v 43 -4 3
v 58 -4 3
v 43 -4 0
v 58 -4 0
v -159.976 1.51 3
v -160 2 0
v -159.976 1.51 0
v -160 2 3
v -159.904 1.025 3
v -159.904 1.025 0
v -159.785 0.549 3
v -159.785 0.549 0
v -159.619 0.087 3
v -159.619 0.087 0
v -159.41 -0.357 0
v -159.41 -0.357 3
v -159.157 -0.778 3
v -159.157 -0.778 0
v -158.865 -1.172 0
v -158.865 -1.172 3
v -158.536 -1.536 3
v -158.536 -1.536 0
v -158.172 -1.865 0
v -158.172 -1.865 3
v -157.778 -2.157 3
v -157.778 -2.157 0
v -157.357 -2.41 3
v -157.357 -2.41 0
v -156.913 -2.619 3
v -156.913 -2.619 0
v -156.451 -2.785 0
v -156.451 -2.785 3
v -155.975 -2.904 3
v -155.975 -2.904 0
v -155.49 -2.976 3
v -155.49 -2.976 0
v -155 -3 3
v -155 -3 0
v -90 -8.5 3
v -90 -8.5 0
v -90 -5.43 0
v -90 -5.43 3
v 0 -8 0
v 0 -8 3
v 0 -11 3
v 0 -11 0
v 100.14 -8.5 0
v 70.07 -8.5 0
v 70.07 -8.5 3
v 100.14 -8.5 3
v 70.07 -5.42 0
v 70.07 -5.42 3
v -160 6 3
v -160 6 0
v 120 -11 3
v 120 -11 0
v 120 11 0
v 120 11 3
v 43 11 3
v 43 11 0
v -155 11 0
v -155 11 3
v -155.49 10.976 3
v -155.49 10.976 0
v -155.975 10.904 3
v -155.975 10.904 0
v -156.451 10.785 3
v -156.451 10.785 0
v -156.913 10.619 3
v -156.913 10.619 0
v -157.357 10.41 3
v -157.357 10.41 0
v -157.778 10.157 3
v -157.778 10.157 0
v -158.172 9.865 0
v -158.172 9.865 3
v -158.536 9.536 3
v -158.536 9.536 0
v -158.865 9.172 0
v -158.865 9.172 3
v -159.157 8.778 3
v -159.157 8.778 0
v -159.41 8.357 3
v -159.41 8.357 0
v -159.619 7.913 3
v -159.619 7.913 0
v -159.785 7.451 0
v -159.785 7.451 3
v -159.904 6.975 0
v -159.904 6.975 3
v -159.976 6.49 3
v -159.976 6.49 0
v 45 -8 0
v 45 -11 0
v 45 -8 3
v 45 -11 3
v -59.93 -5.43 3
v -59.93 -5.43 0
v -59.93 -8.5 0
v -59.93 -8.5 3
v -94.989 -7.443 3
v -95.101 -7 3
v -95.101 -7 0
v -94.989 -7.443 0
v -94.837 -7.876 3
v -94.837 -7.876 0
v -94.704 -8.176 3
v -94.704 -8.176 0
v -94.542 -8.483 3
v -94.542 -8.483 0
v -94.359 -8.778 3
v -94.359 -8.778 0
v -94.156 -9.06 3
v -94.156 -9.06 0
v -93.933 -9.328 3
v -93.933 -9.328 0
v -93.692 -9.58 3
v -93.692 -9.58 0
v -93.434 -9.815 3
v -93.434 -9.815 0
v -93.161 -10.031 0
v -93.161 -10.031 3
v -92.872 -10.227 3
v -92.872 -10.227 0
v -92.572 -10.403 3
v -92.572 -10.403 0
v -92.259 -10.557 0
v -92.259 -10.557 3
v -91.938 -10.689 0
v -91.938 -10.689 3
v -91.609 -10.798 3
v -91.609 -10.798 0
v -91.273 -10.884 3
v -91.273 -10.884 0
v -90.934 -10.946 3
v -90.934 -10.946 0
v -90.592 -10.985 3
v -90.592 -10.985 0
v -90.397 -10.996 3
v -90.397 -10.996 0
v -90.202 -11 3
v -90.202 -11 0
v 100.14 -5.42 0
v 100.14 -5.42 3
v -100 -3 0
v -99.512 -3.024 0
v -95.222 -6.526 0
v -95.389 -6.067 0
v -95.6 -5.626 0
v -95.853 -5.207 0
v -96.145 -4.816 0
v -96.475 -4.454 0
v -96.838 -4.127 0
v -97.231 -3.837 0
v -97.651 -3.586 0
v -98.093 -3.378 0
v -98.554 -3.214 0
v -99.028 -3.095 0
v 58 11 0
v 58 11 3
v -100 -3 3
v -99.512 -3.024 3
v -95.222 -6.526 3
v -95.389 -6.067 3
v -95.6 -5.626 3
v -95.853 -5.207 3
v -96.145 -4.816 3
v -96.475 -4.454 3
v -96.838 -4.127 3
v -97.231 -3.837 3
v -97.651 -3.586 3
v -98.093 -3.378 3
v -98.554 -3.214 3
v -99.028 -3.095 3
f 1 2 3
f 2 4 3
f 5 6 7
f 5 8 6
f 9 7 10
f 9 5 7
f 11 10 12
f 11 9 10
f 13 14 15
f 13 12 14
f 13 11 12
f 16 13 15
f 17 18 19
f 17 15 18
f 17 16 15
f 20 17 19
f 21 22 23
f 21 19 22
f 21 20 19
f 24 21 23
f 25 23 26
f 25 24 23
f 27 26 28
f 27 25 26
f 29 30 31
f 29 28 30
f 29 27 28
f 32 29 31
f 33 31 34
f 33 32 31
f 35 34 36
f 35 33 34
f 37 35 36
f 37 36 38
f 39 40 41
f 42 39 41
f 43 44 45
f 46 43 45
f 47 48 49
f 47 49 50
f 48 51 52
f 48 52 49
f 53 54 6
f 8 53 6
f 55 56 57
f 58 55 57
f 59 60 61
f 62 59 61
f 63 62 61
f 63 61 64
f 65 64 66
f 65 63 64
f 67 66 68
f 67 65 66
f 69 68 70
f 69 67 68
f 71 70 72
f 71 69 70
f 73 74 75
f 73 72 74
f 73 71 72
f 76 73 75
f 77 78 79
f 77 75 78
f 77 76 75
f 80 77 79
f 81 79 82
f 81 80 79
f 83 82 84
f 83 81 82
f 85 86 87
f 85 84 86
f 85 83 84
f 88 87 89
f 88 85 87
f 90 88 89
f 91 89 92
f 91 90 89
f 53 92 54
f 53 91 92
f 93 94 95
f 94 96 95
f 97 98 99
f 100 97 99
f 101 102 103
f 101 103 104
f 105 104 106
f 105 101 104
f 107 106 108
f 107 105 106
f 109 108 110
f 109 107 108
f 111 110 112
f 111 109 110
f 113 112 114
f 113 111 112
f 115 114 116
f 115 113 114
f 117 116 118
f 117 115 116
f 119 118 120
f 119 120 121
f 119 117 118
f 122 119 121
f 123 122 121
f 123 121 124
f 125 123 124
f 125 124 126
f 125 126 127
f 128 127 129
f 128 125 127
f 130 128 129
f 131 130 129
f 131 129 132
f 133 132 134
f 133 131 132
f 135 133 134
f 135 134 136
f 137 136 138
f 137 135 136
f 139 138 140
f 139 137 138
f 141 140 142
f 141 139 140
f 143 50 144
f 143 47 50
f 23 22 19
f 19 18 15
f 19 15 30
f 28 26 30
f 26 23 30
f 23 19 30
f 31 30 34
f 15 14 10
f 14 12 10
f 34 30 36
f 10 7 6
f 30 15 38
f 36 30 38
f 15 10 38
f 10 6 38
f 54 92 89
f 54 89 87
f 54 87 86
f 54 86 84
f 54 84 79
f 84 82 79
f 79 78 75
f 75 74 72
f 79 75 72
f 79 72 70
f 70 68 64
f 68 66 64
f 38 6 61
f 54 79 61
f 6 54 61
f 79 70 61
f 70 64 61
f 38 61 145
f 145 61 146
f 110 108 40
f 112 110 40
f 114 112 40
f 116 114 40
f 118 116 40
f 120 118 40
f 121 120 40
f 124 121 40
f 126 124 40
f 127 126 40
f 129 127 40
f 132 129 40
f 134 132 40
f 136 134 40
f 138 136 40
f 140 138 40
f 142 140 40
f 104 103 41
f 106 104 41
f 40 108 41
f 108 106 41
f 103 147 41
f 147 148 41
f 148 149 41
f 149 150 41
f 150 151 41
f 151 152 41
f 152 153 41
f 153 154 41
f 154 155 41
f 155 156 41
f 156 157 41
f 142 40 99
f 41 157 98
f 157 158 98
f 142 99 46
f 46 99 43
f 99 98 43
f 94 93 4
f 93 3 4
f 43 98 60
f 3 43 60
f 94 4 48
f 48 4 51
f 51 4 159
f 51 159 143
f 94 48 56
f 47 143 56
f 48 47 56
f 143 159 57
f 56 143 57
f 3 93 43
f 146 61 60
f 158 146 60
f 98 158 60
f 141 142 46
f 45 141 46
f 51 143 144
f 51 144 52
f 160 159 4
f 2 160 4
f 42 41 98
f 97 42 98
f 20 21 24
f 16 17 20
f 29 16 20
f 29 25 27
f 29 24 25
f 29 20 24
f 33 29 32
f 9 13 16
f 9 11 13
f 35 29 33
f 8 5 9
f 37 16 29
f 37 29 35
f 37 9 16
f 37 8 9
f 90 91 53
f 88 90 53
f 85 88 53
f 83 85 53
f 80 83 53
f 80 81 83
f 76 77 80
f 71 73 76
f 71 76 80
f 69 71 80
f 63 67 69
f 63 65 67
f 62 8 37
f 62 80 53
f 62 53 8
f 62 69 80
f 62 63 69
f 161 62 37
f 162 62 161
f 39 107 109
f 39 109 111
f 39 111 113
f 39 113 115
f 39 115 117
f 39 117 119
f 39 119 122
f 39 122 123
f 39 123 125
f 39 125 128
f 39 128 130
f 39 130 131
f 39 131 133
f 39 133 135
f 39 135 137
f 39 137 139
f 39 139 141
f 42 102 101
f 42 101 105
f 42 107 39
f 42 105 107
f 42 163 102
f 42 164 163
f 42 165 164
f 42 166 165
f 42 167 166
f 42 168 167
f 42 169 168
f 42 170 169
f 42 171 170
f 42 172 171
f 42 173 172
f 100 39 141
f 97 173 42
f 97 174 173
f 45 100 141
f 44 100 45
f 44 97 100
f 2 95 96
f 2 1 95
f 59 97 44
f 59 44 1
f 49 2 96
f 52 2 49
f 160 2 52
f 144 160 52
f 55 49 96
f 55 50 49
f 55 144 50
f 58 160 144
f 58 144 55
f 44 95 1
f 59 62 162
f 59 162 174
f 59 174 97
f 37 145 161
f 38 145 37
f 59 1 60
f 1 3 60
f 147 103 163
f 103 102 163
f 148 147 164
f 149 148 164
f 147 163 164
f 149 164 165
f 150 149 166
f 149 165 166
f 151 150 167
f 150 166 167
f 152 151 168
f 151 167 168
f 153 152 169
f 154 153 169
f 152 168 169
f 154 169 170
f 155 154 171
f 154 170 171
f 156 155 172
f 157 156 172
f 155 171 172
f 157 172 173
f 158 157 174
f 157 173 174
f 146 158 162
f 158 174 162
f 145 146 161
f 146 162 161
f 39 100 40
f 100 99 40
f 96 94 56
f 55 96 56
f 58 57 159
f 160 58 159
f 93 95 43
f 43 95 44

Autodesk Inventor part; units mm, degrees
ref_plane "YZ Plane" through (0, 0, 0) normal (1, 0, 0) x (0, 1, 0)
ref_plane "XZ Plane" through (0, 0, 0) normal (0, 1, 0) x (-1, 0, 0)
ref_plane "XY Plane" through (0, 0, 0) normal (0, 0, 1) x (1, 0, 0)
sketch "Sketch1" plane through (0, 0, 0) normal (0, 0, 1) x (1, 0, 0)
  line L0 (-120, -11) -> (120, -11)
  line L1 (120, -11) -> (120, 11)
  line L2 (120, 11) -> (-120, 11)
  line L3 (-120, 11) -> (-120, -11)
  line L4 (-120, -11) -> (120, 11) construction
  line L5 (120, -11) -> (-120, 11) construction
  line L6 (-90, -5.43) -> (-59.93, -5.43)
  line L7 (-59.93, -5.43) -> (-59.93, -8.5)
  line L8 (-59.93, -8.5) -> (-90, -8.5)
  line L9 (-90, -8.5) -> (-90, -5.43)
  line L10 (-90, -5.43) -> (-59.93, -8.5) construction
  line L11 (-59.93, -5.43) -> (-90, -8.5) construction
  line L12 (100.14, -5.42) -> (70.07, -5.42)
  line L13 (70.07, -5.42) -> (70.07, -8.5)
  line L14 (70.07, -8.5) -> (100.14, -8.5)
  line L15 (100.14, -8.5) -> (100.14, -5.42)
  line L16 (100.14, -5.42) -> (70.07, -8.5) construction
  line L17 (70.07, -5.42) -> (100.14, -8.5) construction
  line L18 (-120, -11) -> (-95, -11)
  line L19 (-95, -11) -> (-95, -3)
  line L20 (-95, -3) -> (-120, -3)
  line L21 (-120, -3) -> (-120, -11)
  line L22 (43, 11) -> (58, 11)
  line L23 (58, 11) -> (58, -4)
  line L24 (58, -4) -> (43, -4)
  line L25 (43, -4) -> (43, 11)
  line L26 (-120, 11) -> (-160, 11)
  line L27 (-160, 11) -> (-160, -3)
  line L28 (-160, -3) -> (-120, -3)
  line L29 (-120, -3) -> (-120, 11)
  point P0 (0, 0)
  point P1 (0, 0)
  point P2 (-74.965, -6.965)
  point P3 (85.105, -6.96)
  point P4 (58, 11)
  point P5 (-140, -3)
  dimension "d0" = 240
  dimension "d1" = 22
  dimension "d2" = 30.07
  dimension "d3" = 3.07
  dimension "d4" = 2.5
  dimension "d5" = 30
  dimension "d6" = 30.07
  dimension "d7" = 3.08
  dimension "d8" = 2.5
  dimension "d9" = 130
  dimension "d10" = 25
  dimension "d11" = 8
  dimension "d12" = 15
  dimension "d13" = 15
  dimension "d14" = 43
  dimension "d17" = 40
extrude "Plate1" add sketch "Sketch1" along normal blind 3 contours L19 L20 L3 L2 L25 L24 L23 L1 L0 | L28 L27 L26 L3
fillet "Corner Round1" radius 5 4 edges at (-95, -3, 1.5) (-95, -11, 1.5) (-160, -3, 1.5) (-160, 11, 1.5)
sketch "Sketch3" plane through (0, 0, 3) normal (0, 0, 1) x (1, 0, 0)
  line L0 (-90.202, -11) -> (120, -11) projected
  line L1 (0, -11) -> (45, -11)
  line L2 (45, -11) -> (45, -8)
  line L3 (45, -8) -> (0, -8)
  line L4 (0, -8) -> (0, -11)
  point P0 (0, 0)
  dimension "d22" = 3
  dimension "d23" = 45
extrude "Cut2" cut sketch "Sketch3" against normal blind 3
equation "\"d24\" = Thickness"
equation "\"d15\" = Thickness"
equation "\"BendRadius\" = Thickness"
equation "\"BendReliefWidth\" = Thickness"
equation "\"BendReliefDepth\" = 0.5 * Thickness"
equation "\"CornerReliefSize\" = 4 * Thickness"
equation "\"MinimumRemnant\" = 2 * Thickness"
equation "\"TransitionRadius\" = BendRadius"
equation "\"JacobiRadiusSize\" = BendRadius"
equation "\"GapSize\" = Thickness"
equation "\"Thickness\" = 3"
properties part number "Starting Path Wall ( Servo )"
